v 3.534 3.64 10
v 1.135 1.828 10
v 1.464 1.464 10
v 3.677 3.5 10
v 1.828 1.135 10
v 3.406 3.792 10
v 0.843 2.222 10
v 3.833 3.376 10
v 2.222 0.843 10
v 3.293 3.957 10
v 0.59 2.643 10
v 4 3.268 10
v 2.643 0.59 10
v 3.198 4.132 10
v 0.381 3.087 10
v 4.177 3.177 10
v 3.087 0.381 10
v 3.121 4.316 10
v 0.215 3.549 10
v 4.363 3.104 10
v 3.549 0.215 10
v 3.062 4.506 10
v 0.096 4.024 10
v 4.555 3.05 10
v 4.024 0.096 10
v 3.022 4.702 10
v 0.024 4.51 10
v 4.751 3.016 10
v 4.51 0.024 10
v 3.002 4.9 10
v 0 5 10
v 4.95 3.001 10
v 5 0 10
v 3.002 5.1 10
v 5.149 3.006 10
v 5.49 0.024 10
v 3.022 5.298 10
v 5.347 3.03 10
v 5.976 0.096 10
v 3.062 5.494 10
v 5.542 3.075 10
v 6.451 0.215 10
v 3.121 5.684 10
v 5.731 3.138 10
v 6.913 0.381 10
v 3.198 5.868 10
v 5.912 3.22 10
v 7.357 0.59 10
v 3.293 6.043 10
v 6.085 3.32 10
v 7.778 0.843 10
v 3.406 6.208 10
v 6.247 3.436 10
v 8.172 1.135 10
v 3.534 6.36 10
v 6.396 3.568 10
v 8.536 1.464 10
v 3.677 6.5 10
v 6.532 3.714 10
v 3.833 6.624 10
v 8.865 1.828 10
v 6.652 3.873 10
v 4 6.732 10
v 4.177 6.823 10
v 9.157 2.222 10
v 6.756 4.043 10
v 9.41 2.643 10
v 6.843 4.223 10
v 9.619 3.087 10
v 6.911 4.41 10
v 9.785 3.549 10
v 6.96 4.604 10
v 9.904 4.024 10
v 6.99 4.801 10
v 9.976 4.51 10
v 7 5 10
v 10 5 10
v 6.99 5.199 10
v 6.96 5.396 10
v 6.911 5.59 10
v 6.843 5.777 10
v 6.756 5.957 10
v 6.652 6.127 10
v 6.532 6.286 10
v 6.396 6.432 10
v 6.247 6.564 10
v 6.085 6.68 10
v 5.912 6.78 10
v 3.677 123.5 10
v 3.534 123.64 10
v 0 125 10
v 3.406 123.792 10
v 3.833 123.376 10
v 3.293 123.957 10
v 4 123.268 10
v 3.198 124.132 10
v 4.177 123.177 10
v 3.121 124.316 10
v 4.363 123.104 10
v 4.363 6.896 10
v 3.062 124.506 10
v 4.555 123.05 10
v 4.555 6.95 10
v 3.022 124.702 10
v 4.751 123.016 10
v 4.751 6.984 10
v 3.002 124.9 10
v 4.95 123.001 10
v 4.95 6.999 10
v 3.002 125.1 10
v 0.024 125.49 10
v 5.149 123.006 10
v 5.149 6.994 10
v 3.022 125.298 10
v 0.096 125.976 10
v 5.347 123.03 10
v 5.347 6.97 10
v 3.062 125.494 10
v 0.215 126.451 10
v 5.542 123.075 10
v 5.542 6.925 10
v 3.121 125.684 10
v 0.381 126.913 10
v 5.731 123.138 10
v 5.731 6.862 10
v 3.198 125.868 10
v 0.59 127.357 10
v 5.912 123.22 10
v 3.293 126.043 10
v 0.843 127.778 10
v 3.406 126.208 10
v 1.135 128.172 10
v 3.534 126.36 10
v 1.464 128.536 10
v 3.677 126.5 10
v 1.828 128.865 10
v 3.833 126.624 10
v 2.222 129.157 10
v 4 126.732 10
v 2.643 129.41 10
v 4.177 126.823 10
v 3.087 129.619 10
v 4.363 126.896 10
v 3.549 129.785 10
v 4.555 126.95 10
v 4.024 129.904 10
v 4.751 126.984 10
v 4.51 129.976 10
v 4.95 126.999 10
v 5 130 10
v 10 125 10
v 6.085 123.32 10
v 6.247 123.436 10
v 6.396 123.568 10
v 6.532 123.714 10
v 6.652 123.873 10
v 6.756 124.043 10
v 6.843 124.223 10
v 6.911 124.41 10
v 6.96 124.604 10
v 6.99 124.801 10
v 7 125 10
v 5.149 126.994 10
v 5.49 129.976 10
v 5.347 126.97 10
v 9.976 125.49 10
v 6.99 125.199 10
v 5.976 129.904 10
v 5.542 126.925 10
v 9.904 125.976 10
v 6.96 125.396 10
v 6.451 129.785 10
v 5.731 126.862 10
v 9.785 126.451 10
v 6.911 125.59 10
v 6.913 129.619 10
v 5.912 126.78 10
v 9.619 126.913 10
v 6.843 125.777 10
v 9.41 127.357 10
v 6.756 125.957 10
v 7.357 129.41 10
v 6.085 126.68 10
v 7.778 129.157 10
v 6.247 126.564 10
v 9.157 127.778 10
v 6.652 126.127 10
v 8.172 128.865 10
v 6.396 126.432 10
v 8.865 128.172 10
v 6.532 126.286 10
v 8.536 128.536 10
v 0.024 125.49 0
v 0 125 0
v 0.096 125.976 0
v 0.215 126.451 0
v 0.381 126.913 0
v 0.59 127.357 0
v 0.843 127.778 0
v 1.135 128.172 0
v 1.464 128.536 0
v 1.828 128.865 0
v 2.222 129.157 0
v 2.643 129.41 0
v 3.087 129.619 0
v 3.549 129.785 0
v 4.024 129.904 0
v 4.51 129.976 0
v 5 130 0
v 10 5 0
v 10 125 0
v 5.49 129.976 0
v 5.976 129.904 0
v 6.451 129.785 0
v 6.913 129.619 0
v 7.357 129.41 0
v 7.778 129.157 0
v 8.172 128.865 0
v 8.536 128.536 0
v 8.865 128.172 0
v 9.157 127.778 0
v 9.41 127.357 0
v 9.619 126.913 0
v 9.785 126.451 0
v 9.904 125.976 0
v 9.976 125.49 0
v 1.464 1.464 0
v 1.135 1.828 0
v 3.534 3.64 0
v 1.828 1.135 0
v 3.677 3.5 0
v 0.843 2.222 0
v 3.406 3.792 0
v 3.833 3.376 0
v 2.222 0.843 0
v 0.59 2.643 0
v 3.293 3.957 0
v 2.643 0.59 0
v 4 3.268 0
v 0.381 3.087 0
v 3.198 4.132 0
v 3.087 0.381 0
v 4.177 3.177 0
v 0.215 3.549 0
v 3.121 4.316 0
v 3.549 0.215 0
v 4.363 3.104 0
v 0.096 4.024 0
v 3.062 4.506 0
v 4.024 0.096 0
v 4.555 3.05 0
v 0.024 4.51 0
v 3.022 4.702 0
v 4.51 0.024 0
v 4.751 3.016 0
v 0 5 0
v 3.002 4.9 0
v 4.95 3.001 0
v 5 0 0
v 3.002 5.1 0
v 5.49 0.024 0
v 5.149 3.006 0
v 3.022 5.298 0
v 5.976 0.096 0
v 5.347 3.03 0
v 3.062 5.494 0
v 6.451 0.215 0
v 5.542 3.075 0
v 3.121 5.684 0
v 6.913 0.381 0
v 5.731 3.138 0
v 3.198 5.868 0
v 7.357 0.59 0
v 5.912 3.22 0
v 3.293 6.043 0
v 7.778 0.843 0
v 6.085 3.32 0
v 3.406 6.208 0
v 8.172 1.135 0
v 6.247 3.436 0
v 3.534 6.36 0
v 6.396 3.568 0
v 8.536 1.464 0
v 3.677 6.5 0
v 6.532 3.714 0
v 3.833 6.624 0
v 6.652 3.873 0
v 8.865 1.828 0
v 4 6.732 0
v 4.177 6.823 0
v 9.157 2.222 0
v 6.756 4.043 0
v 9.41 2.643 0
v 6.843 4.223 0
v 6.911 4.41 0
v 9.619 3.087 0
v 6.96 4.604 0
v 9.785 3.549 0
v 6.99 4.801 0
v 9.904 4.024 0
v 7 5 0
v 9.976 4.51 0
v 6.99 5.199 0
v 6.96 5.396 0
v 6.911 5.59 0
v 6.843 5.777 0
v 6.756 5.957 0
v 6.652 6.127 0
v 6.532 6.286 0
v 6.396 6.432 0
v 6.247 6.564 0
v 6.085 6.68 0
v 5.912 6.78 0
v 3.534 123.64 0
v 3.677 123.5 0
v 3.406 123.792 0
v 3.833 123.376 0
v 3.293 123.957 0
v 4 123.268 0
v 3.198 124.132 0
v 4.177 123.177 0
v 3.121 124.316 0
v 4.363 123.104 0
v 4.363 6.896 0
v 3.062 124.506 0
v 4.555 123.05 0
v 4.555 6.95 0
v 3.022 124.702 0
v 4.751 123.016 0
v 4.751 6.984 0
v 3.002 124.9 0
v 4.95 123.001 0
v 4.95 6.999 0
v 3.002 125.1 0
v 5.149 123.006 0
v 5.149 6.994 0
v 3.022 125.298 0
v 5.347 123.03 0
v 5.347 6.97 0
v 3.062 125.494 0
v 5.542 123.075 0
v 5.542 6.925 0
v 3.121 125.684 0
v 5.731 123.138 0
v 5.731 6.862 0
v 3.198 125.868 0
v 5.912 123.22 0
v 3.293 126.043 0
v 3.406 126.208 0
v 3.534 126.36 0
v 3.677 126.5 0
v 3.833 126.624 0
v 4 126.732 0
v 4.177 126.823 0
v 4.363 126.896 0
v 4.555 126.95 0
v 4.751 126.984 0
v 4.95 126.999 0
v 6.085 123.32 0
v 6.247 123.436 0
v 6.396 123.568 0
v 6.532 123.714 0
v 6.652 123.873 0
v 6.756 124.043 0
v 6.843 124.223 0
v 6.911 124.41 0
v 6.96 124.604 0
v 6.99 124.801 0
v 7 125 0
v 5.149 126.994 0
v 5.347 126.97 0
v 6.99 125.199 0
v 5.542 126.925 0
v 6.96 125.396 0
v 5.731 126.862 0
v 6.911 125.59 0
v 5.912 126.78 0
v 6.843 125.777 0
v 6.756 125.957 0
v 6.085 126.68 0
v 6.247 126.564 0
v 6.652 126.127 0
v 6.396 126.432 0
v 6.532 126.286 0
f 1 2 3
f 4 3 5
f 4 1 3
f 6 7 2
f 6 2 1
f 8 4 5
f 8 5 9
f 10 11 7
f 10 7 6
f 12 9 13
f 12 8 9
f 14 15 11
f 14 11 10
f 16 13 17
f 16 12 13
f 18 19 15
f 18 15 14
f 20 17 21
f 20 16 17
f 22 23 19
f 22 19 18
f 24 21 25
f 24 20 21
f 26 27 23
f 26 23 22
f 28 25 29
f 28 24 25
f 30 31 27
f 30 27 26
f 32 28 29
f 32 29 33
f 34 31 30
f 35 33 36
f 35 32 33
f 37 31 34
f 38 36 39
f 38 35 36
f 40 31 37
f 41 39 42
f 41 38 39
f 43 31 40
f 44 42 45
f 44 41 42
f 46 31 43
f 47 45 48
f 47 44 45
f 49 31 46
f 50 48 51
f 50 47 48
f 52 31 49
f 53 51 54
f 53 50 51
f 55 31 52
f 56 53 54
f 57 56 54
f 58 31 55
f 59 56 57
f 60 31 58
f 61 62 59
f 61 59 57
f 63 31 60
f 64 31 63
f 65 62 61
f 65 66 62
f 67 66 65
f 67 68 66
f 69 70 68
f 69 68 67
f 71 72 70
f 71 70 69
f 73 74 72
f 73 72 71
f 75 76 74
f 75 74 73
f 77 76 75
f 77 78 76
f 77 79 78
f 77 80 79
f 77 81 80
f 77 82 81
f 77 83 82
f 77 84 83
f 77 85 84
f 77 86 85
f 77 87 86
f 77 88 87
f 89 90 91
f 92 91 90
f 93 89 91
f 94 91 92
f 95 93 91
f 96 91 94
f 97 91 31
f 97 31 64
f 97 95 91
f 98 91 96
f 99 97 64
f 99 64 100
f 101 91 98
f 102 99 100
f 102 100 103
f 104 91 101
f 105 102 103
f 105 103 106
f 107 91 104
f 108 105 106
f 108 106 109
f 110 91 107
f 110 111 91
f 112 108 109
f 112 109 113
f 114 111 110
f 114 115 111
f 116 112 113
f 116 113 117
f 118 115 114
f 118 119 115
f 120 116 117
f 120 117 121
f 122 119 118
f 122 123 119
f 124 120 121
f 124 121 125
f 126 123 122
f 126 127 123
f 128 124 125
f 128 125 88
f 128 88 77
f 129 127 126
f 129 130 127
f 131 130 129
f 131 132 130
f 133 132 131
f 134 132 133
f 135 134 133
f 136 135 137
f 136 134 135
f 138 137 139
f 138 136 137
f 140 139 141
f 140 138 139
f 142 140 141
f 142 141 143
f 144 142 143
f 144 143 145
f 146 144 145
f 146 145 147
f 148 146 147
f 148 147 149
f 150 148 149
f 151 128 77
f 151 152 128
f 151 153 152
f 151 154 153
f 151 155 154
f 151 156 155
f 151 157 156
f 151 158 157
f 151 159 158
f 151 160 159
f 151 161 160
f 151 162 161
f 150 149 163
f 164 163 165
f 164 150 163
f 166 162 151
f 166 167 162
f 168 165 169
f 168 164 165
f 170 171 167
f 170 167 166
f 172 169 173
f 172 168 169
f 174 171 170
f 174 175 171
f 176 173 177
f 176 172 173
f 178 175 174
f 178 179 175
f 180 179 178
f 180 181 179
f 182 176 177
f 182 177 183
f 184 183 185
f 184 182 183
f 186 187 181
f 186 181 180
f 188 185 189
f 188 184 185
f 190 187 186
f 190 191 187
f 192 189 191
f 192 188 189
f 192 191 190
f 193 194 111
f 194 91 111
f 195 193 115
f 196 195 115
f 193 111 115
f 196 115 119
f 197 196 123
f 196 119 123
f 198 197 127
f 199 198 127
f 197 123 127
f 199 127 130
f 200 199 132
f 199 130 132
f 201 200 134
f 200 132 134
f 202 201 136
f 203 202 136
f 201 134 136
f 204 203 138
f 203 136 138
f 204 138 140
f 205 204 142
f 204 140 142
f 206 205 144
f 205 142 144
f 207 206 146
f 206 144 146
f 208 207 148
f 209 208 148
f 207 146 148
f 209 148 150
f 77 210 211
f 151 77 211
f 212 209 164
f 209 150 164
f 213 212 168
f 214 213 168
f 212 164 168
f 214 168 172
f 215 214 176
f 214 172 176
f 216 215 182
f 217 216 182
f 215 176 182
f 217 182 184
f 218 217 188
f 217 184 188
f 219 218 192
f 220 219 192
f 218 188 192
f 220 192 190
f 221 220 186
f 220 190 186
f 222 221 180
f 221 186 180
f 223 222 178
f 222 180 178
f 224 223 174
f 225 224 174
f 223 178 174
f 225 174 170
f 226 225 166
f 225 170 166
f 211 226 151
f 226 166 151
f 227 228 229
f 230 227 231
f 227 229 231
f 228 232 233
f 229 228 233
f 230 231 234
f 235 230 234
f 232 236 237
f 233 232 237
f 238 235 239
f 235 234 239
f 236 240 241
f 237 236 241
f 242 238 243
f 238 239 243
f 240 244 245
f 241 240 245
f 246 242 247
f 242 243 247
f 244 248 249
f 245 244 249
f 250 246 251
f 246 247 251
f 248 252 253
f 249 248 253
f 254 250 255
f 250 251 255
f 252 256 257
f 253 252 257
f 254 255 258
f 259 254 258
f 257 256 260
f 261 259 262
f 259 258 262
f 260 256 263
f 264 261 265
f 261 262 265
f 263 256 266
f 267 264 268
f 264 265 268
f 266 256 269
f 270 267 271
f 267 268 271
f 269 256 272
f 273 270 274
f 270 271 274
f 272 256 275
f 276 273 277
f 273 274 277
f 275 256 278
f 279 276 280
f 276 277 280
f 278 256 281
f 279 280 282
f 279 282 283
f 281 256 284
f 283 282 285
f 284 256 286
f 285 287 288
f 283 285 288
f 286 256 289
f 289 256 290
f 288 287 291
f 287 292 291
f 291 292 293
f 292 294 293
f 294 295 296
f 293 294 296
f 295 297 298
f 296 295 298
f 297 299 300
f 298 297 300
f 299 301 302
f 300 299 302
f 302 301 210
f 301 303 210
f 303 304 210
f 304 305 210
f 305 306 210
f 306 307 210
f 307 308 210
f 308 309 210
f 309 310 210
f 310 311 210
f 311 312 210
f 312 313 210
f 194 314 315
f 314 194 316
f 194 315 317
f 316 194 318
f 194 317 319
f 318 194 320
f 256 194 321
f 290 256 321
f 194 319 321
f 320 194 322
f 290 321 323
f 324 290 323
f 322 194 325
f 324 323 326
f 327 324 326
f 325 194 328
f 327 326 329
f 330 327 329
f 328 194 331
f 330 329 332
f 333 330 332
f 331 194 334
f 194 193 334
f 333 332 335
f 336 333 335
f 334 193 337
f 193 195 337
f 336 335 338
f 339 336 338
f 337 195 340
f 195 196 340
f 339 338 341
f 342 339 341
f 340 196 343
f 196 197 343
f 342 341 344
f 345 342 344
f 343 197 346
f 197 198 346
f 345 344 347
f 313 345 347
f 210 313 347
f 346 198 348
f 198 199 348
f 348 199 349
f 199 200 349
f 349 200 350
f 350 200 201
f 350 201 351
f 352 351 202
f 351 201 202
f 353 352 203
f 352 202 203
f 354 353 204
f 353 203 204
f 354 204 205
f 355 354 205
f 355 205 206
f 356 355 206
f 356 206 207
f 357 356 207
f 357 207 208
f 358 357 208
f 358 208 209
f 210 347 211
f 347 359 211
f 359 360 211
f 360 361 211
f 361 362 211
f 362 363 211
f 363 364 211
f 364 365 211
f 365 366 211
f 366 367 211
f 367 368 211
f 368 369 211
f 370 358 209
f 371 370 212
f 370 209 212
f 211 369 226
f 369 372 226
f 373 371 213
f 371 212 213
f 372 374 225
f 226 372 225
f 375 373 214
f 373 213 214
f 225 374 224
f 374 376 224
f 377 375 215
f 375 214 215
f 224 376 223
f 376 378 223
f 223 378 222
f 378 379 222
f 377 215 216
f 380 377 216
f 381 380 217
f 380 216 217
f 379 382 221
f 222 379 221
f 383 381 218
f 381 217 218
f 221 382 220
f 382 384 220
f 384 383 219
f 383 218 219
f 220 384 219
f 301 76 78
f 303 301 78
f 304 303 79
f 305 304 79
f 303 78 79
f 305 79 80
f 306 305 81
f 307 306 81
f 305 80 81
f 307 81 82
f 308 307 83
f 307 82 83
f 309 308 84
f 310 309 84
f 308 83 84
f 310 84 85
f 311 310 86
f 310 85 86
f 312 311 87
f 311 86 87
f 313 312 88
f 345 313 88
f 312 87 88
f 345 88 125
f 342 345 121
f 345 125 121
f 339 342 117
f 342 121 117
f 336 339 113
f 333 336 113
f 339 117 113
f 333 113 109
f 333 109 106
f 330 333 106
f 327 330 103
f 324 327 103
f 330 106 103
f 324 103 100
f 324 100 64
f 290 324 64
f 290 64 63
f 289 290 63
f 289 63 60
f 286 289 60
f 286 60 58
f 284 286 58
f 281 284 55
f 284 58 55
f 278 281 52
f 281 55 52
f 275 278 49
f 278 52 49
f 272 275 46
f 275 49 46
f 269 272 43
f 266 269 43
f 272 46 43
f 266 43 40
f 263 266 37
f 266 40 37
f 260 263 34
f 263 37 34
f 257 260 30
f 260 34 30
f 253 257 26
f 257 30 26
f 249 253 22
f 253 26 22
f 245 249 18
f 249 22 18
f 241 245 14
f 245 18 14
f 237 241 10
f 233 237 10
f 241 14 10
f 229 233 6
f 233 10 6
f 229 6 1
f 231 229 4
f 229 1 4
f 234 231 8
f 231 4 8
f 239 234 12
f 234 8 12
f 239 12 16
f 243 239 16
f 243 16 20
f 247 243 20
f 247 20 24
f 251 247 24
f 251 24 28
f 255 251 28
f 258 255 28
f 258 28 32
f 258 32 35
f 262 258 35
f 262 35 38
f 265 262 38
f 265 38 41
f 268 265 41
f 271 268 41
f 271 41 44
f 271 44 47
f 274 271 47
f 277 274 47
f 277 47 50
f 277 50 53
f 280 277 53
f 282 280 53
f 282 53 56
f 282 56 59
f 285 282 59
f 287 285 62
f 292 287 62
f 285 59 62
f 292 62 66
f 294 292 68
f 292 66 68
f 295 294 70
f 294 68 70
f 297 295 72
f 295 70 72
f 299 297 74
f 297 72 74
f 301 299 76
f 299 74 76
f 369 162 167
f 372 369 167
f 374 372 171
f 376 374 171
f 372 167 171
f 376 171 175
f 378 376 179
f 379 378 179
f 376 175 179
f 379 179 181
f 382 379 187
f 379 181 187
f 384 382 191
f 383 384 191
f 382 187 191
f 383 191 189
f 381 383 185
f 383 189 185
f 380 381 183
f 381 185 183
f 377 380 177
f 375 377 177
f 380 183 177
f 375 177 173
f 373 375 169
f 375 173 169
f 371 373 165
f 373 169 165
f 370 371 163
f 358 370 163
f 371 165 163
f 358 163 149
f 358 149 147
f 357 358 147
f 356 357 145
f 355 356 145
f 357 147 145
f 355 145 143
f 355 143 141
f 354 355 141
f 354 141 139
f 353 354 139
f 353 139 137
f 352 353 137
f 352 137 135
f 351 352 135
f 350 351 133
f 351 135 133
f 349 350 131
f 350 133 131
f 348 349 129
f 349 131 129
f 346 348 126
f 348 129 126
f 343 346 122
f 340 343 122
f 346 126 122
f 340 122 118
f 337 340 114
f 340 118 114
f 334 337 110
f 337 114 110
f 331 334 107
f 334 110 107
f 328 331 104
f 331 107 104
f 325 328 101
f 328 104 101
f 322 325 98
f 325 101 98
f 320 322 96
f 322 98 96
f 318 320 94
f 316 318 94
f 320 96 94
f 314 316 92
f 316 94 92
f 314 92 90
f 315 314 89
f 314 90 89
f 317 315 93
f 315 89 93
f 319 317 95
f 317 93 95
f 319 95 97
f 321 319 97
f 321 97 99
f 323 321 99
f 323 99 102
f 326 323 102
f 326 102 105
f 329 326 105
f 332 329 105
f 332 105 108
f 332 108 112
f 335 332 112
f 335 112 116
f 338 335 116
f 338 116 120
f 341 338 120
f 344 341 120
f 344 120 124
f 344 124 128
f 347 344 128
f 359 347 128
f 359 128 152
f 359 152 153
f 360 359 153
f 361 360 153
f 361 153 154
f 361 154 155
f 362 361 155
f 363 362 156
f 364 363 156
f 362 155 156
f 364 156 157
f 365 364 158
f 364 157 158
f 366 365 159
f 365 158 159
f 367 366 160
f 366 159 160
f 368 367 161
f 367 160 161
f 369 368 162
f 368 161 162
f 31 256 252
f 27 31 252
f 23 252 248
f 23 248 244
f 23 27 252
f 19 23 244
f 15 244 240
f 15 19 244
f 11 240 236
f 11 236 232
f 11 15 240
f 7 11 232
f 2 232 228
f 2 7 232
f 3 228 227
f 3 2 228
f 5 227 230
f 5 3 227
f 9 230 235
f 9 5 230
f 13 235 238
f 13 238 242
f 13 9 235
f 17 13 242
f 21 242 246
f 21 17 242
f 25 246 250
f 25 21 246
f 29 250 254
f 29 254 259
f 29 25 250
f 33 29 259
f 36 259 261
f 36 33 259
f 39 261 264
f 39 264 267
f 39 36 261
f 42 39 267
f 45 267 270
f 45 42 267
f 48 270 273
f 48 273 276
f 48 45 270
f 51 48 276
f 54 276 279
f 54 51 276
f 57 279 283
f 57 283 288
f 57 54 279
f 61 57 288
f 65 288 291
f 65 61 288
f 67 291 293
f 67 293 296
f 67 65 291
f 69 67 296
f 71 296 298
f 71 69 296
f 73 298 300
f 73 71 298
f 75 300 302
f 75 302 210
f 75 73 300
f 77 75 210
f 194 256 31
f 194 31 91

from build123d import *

# Parameters (mm, degrees)
ESQUISSE1_W             = 10
ESQUISSE1_H             = 130
BOSS_EXTRU_1_DEPTH      = 10
ESQUISSE2_R             = 2
ENL_V_MAT_EXTRU_1_DEPTH = 10
CONG_1_R                = 5


with BuildPart() as part:
    # Esquisse1 → Boss.-Extru.1 (new body)
    with BuildSketch(Plane.XY):
        with Locations((5, 65)):
            Rectangle(ESQUISSE1_W, ESQUISSE1_H)
    extrude(amount=BOSS_EXTRU_1_DEPTH)

    # Esquisse2 → Enlèv. mat.-Extru.1 (cut)
    with BuildSketch(Plane.XY.offset(10)):
        with Locations((5, 125)):
            Circle(ESQUISSE2_R)
        with Locations((5, 5)):
            Circle(ESQUISSE2_R)
    extrude(amount=-ENL_V_MAT_EXTRU_1_DEPTH, mode=Mode.SUBTRACT)

    # Congé1
    cong_1_edges = [part.edges().sort_by_distance(p)[0] for p in [
        (10, 130, 5),
        (0, 130, 5),
        (10, 0, 5),
        (0, 0, 5),
    ]]
    fillet(cong_1_edges, radius=CONG_1_R - 0.0001)  # a hair under: the kernel refuses the full size


solid = part.part
